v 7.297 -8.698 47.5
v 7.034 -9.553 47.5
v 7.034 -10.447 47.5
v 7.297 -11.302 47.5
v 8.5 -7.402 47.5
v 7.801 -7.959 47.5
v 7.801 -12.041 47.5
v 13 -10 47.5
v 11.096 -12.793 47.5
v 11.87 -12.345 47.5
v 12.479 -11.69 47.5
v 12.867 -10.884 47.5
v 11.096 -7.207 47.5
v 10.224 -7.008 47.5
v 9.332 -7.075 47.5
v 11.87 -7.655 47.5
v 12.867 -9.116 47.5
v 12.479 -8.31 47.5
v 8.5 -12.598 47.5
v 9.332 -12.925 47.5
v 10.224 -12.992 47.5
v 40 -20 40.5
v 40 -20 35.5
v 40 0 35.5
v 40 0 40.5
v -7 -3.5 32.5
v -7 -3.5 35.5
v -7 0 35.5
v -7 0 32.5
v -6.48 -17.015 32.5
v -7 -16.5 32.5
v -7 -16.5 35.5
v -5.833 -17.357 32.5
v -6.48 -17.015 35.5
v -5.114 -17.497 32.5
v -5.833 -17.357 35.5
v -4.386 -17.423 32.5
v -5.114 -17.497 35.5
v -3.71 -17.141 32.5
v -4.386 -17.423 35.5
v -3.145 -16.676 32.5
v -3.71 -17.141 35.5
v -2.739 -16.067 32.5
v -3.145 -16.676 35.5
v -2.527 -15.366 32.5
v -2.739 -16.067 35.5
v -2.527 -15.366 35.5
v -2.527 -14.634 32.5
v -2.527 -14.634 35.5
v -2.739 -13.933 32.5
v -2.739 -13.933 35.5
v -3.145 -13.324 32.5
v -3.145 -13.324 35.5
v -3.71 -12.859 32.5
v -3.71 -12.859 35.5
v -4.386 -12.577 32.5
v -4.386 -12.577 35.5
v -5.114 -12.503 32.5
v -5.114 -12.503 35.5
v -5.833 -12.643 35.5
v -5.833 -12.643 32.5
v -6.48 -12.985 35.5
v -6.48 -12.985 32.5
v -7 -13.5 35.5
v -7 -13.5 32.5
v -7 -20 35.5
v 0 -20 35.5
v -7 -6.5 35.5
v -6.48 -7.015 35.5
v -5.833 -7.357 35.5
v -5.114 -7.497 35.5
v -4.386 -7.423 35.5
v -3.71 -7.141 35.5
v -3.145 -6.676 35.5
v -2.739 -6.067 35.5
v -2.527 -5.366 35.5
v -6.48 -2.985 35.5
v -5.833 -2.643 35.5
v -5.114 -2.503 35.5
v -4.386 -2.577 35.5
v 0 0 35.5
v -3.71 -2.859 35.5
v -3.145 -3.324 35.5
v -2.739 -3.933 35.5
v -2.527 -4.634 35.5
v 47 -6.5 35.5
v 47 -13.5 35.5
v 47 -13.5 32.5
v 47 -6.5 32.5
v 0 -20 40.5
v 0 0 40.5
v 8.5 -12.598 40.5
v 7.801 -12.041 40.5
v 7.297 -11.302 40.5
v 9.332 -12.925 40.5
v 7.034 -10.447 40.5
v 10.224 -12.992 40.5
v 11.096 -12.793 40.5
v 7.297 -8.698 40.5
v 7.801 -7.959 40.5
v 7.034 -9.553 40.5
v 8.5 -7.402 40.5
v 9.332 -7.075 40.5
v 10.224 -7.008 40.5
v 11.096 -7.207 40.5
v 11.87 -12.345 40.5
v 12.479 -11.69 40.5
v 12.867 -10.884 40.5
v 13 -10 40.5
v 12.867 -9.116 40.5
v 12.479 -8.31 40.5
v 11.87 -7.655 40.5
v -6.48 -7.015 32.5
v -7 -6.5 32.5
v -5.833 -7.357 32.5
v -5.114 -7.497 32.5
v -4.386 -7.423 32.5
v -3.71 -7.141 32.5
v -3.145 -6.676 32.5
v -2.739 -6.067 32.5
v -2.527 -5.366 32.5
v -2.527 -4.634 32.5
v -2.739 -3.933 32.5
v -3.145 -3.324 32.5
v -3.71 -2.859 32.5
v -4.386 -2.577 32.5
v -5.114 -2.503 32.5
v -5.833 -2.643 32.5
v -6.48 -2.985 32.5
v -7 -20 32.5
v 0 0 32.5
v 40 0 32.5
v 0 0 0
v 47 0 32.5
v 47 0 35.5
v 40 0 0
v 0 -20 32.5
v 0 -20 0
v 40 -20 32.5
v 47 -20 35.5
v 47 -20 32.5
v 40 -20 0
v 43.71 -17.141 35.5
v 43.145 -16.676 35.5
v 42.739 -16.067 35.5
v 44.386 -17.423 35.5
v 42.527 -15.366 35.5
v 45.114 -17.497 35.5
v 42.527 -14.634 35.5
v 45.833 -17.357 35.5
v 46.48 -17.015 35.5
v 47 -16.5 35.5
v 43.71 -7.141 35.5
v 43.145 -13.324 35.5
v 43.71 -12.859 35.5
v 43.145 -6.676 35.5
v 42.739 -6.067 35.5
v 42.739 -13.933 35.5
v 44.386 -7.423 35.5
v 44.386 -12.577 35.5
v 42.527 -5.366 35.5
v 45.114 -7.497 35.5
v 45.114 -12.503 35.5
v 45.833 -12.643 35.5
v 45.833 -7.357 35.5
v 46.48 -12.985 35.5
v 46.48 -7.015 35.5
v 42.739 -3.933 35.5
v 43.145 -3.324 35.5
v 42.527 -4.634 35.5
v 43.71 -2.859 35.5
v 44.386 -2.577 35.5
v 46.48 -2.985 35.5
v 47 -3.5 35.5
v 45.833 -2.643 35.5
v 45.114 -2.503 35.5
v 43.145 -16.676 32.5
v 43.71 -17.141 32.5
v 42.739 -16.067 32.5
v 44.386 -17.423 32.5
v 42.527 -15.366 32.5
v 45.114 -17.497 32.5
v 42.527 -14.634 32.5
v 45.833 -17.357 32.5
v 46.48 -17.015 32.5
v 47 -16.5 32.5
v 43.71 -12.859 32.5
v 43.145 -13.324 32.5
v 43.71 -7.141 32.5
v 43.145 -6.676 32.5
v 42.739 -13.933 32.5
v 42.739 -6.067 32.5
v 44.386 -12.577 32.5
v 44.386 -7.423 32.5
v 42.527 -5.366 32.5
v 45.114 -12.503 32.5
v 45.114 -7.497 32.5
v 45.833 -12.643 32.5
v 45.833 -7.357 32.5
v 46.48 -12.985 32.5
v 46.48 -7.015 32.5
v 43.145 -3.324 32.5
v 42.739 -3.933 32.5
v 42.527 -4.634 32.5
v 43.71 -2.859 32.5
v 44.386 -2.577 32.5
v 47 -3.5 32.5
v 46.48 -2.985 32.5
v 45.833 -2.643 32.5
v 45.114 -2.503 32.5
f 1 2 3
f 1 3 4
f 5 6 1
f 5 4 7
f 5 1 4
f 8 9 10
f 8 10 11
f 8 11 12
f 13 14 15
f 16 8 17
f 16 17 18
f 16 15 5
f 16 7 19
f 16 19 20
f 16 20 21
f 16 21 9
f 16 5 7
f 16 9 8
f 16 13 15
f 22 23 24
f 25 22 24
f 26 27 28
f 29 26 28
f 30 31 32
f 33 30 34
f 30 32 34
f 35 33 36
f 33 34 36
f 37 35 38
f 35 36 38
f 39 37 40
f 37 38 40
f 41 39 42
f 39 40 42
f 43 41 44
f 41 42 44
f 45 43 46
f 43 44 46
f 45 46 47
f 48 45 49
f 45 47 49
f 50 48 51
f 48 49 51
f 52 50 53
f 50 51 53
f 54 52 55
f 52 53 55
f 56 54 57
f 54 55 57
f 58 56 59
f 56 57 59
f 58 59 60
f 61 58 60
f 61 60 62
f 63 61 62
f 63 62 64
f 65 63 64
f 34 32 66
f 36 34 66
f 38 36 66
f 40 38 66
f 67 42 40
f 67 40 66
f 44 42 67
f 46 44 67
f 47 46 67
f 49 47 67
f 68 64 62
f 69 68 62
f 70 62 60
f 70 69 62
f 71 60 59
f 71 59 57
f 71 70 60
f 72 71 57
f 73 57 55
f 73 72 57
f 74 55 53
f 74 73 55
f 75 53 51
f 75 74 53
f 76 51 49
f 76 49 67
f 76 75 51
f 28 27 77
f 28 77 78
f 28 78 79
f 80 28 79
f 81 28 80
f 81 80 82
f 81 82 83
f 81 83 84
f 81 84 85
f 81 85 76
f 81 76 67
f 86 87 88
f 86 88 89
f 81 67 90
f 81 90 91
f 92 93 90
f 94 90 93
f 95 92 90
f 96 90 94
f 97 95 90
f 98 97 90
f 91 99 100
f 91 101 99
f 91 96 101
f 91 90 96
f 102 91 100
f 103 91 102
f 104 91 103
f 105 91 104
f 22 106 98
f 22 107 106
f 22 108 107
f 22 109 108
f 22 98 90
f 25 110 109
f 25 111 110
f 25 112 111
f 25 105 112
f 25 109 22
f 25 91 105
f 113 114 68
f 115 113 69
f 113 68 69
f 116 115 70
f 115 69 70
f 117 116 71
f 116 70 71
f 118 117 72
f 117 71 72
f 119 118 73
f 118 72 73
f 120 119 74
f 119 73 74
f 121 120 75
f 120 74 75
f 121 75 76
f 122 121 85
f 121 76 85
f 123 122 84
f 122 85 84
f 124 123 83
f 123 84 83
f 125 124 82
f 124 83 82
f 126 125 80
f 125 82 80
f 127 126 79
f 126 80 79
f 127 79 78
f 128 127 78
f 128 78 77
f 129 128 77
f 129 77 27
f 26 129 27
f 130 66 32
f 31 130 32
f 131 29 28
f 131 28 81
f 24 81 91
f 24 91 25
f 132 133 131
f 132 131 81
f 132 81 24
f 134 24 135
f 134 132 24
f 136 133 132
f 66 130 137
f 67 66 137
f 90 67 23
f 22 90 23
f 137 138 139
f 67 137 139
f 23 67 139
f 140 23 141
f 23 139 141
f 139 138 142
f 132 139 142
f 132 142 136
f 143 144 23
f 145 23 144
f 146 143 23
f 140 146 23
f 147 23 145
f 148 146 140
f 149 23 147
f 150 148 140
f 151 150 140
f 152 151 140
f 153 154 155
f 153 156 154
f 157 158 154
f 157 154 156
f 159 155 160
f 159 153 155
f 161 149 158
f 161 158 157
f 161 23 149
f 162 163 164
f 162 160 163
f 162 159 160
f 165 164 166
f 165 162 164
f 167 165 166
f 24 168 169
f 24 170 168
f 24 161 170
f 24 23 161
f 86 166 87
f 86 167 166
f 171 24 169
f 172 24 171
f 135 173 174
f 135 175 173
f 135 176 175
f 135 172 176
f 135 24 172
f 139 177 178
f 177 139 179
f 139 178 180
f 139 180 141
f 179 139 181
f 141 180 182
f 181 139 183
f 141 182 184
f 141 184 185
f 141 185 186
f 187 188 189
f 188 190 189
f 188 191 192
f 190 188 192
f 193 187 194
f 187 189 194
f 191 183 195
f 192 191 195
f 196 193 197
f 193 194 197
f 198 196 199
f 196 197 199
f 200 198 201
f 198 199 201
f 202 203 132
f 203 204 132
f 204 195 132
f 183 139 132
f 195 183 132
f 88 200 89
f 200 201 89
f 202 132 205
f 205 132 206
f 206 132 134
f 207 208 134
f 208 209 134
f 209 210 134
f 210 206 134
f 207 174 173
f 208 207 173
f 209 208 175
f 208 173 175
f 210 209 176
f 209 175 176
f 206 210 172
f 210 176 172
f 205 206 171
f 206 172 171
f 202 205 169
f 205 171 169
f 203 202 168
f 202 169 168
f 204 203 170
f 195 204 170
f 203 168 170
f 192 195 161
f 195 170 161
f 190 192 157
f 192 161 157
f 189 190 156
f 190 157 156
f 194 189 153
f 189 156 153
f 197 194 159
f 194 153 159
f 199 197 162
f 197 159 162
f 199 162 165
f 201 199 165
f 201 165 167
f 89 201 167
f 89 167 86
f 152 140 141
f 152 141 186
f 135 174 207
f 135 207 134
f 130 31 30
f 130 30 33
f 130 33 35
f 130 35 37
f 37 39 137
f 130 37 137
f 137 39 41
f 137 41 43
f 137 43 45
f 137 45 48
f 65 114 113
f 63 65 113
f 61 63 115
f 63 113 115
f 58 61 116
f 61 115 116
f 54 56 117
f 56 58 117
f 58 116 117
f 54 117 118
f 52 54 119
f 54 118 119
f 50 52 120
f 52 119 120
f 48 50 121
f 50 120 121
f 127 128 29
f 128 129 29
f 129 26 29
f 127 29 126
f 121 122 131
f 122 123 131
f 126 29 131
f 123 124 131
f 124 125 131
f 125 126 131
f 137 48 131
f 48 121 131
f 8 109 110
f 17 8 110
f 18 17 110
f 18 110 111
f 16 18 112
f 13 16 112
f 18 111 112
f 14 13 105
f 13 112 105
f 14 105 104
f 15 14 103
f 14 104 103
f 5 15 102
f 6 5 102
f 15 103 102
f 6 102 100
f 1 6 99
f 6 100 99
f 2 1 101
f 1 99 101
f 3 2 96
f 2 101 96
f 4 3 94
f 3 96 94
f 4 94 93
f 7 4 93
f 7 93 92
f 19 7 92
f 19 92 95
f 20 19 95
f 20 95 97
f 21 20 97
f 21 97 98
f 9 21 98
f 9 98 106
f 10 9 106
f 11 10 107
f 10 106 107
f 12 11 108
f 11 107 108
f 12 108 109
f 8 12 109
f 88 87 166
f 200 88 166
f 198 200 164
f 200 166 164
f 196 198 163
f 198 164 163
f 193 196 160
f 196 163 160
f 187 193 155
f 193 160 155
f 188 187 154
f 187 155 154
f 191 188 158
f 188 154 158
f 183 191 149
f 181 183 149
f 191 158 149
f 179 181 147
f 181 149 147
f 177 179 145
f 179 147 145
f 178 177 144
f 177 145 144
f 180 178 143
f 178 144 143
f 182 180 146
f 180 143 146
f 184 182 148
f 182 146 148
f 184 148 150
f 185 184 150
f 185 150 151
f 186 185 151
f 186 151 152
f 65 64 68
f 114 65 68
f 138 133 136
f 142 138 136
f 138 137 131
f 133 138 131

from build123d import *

# Parameters (mm, degrees)
SKETCH_1_W          = 40
SKETCH_1_H          = 20
EXTRUDE_1_DEPTH     = 40.5
SKETCH_2_R          = 3
EXTRUDE_2_DEPTH     = 7
EXTRUDE_START       = -5
SKETCH_3_W          = 7
SKETCH_3_H          = 20
EXTRUDE_3_DEPTH     = 3
SKETCH_4_R          = 2.5
CUT_EXTRUDE_1_DEPTH = 10


with BuildPart() as part:
    # 草图1 → 凸台-拉伸1 (new body)
    with BuildSketch(Plane.XY):
        with Locations((20, -10)):
            Rectangle(SKETCH_1_W, SKETCH_1_H)
    extrude(amount=EXTRUDE_1_DEPTH)

    # 草图2 → 凸台-拉伸2 (add)
    with BuildSketch(Plane.XY.offset(40.5)):
        with Locations((10, -10)):
            Circle(SKETCH_2_R)
    extrude(amount=EXTRUDE_2_DEPTH)

    # 草图3 → 凸台-拉伸3 (add)
    with BuildSketch(Plane.XY.offset(40.5).offset(EXTRUDE_START)):
        with Locations((43.5, -10)):
            Rectangle(SKETCH_3_W, SKETCH_3_H)
        with Locations((-3.5, -10)):
            Rectangle(SKETCH_3_W, SKETCH_3_H)
    extrude(amount=-EXTRUDE_3_DEPTH)

    # 草图4 → 切除-拉伸1 (cut)
    with BuildSketch(Plane.XY.offset(35.5)):
        with Locations((-5, -5)):
            Circle(SKETCH_4_R)
        with Locations((45, -5)):
            Circle(SKETCH_4_R)
        with Locations((-5, -15)):
            Circle(SKETCH_4_R)
        with Locations((45, -15)):
            Circle(SKETCH_4_R)
    extrude(amount=-CUT_EXTRUDE_1_DEPTH, mode=Mode.SUBTRACT)


solid = part.part
